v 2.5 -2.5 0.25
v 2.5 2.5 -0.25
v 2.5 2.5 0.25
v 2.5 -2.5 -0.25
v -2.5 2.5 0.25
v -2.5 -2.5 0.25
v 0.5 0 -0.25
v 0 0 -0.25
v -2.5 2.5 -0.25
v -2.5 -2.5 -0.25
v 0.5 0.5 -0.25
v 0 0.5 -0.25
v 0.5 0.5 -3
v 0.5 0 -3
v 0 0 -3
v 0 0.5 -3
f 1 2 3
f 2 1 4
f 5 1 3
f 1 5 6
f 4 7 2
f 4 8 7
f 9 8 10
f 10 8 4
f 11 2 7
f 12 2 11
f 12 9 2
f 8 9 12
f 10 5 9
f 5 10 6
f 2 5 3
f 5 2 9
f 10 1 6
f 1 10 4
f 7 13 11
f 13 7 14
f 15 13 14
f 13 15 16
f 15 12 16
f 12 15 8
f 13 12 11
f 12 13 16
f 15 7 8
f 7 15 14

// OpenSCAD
x=5;
y=5;

union() {
cube([x,y,.5],true);
translate([0,0,-3]) cube([.5,.5,3],false);
}
